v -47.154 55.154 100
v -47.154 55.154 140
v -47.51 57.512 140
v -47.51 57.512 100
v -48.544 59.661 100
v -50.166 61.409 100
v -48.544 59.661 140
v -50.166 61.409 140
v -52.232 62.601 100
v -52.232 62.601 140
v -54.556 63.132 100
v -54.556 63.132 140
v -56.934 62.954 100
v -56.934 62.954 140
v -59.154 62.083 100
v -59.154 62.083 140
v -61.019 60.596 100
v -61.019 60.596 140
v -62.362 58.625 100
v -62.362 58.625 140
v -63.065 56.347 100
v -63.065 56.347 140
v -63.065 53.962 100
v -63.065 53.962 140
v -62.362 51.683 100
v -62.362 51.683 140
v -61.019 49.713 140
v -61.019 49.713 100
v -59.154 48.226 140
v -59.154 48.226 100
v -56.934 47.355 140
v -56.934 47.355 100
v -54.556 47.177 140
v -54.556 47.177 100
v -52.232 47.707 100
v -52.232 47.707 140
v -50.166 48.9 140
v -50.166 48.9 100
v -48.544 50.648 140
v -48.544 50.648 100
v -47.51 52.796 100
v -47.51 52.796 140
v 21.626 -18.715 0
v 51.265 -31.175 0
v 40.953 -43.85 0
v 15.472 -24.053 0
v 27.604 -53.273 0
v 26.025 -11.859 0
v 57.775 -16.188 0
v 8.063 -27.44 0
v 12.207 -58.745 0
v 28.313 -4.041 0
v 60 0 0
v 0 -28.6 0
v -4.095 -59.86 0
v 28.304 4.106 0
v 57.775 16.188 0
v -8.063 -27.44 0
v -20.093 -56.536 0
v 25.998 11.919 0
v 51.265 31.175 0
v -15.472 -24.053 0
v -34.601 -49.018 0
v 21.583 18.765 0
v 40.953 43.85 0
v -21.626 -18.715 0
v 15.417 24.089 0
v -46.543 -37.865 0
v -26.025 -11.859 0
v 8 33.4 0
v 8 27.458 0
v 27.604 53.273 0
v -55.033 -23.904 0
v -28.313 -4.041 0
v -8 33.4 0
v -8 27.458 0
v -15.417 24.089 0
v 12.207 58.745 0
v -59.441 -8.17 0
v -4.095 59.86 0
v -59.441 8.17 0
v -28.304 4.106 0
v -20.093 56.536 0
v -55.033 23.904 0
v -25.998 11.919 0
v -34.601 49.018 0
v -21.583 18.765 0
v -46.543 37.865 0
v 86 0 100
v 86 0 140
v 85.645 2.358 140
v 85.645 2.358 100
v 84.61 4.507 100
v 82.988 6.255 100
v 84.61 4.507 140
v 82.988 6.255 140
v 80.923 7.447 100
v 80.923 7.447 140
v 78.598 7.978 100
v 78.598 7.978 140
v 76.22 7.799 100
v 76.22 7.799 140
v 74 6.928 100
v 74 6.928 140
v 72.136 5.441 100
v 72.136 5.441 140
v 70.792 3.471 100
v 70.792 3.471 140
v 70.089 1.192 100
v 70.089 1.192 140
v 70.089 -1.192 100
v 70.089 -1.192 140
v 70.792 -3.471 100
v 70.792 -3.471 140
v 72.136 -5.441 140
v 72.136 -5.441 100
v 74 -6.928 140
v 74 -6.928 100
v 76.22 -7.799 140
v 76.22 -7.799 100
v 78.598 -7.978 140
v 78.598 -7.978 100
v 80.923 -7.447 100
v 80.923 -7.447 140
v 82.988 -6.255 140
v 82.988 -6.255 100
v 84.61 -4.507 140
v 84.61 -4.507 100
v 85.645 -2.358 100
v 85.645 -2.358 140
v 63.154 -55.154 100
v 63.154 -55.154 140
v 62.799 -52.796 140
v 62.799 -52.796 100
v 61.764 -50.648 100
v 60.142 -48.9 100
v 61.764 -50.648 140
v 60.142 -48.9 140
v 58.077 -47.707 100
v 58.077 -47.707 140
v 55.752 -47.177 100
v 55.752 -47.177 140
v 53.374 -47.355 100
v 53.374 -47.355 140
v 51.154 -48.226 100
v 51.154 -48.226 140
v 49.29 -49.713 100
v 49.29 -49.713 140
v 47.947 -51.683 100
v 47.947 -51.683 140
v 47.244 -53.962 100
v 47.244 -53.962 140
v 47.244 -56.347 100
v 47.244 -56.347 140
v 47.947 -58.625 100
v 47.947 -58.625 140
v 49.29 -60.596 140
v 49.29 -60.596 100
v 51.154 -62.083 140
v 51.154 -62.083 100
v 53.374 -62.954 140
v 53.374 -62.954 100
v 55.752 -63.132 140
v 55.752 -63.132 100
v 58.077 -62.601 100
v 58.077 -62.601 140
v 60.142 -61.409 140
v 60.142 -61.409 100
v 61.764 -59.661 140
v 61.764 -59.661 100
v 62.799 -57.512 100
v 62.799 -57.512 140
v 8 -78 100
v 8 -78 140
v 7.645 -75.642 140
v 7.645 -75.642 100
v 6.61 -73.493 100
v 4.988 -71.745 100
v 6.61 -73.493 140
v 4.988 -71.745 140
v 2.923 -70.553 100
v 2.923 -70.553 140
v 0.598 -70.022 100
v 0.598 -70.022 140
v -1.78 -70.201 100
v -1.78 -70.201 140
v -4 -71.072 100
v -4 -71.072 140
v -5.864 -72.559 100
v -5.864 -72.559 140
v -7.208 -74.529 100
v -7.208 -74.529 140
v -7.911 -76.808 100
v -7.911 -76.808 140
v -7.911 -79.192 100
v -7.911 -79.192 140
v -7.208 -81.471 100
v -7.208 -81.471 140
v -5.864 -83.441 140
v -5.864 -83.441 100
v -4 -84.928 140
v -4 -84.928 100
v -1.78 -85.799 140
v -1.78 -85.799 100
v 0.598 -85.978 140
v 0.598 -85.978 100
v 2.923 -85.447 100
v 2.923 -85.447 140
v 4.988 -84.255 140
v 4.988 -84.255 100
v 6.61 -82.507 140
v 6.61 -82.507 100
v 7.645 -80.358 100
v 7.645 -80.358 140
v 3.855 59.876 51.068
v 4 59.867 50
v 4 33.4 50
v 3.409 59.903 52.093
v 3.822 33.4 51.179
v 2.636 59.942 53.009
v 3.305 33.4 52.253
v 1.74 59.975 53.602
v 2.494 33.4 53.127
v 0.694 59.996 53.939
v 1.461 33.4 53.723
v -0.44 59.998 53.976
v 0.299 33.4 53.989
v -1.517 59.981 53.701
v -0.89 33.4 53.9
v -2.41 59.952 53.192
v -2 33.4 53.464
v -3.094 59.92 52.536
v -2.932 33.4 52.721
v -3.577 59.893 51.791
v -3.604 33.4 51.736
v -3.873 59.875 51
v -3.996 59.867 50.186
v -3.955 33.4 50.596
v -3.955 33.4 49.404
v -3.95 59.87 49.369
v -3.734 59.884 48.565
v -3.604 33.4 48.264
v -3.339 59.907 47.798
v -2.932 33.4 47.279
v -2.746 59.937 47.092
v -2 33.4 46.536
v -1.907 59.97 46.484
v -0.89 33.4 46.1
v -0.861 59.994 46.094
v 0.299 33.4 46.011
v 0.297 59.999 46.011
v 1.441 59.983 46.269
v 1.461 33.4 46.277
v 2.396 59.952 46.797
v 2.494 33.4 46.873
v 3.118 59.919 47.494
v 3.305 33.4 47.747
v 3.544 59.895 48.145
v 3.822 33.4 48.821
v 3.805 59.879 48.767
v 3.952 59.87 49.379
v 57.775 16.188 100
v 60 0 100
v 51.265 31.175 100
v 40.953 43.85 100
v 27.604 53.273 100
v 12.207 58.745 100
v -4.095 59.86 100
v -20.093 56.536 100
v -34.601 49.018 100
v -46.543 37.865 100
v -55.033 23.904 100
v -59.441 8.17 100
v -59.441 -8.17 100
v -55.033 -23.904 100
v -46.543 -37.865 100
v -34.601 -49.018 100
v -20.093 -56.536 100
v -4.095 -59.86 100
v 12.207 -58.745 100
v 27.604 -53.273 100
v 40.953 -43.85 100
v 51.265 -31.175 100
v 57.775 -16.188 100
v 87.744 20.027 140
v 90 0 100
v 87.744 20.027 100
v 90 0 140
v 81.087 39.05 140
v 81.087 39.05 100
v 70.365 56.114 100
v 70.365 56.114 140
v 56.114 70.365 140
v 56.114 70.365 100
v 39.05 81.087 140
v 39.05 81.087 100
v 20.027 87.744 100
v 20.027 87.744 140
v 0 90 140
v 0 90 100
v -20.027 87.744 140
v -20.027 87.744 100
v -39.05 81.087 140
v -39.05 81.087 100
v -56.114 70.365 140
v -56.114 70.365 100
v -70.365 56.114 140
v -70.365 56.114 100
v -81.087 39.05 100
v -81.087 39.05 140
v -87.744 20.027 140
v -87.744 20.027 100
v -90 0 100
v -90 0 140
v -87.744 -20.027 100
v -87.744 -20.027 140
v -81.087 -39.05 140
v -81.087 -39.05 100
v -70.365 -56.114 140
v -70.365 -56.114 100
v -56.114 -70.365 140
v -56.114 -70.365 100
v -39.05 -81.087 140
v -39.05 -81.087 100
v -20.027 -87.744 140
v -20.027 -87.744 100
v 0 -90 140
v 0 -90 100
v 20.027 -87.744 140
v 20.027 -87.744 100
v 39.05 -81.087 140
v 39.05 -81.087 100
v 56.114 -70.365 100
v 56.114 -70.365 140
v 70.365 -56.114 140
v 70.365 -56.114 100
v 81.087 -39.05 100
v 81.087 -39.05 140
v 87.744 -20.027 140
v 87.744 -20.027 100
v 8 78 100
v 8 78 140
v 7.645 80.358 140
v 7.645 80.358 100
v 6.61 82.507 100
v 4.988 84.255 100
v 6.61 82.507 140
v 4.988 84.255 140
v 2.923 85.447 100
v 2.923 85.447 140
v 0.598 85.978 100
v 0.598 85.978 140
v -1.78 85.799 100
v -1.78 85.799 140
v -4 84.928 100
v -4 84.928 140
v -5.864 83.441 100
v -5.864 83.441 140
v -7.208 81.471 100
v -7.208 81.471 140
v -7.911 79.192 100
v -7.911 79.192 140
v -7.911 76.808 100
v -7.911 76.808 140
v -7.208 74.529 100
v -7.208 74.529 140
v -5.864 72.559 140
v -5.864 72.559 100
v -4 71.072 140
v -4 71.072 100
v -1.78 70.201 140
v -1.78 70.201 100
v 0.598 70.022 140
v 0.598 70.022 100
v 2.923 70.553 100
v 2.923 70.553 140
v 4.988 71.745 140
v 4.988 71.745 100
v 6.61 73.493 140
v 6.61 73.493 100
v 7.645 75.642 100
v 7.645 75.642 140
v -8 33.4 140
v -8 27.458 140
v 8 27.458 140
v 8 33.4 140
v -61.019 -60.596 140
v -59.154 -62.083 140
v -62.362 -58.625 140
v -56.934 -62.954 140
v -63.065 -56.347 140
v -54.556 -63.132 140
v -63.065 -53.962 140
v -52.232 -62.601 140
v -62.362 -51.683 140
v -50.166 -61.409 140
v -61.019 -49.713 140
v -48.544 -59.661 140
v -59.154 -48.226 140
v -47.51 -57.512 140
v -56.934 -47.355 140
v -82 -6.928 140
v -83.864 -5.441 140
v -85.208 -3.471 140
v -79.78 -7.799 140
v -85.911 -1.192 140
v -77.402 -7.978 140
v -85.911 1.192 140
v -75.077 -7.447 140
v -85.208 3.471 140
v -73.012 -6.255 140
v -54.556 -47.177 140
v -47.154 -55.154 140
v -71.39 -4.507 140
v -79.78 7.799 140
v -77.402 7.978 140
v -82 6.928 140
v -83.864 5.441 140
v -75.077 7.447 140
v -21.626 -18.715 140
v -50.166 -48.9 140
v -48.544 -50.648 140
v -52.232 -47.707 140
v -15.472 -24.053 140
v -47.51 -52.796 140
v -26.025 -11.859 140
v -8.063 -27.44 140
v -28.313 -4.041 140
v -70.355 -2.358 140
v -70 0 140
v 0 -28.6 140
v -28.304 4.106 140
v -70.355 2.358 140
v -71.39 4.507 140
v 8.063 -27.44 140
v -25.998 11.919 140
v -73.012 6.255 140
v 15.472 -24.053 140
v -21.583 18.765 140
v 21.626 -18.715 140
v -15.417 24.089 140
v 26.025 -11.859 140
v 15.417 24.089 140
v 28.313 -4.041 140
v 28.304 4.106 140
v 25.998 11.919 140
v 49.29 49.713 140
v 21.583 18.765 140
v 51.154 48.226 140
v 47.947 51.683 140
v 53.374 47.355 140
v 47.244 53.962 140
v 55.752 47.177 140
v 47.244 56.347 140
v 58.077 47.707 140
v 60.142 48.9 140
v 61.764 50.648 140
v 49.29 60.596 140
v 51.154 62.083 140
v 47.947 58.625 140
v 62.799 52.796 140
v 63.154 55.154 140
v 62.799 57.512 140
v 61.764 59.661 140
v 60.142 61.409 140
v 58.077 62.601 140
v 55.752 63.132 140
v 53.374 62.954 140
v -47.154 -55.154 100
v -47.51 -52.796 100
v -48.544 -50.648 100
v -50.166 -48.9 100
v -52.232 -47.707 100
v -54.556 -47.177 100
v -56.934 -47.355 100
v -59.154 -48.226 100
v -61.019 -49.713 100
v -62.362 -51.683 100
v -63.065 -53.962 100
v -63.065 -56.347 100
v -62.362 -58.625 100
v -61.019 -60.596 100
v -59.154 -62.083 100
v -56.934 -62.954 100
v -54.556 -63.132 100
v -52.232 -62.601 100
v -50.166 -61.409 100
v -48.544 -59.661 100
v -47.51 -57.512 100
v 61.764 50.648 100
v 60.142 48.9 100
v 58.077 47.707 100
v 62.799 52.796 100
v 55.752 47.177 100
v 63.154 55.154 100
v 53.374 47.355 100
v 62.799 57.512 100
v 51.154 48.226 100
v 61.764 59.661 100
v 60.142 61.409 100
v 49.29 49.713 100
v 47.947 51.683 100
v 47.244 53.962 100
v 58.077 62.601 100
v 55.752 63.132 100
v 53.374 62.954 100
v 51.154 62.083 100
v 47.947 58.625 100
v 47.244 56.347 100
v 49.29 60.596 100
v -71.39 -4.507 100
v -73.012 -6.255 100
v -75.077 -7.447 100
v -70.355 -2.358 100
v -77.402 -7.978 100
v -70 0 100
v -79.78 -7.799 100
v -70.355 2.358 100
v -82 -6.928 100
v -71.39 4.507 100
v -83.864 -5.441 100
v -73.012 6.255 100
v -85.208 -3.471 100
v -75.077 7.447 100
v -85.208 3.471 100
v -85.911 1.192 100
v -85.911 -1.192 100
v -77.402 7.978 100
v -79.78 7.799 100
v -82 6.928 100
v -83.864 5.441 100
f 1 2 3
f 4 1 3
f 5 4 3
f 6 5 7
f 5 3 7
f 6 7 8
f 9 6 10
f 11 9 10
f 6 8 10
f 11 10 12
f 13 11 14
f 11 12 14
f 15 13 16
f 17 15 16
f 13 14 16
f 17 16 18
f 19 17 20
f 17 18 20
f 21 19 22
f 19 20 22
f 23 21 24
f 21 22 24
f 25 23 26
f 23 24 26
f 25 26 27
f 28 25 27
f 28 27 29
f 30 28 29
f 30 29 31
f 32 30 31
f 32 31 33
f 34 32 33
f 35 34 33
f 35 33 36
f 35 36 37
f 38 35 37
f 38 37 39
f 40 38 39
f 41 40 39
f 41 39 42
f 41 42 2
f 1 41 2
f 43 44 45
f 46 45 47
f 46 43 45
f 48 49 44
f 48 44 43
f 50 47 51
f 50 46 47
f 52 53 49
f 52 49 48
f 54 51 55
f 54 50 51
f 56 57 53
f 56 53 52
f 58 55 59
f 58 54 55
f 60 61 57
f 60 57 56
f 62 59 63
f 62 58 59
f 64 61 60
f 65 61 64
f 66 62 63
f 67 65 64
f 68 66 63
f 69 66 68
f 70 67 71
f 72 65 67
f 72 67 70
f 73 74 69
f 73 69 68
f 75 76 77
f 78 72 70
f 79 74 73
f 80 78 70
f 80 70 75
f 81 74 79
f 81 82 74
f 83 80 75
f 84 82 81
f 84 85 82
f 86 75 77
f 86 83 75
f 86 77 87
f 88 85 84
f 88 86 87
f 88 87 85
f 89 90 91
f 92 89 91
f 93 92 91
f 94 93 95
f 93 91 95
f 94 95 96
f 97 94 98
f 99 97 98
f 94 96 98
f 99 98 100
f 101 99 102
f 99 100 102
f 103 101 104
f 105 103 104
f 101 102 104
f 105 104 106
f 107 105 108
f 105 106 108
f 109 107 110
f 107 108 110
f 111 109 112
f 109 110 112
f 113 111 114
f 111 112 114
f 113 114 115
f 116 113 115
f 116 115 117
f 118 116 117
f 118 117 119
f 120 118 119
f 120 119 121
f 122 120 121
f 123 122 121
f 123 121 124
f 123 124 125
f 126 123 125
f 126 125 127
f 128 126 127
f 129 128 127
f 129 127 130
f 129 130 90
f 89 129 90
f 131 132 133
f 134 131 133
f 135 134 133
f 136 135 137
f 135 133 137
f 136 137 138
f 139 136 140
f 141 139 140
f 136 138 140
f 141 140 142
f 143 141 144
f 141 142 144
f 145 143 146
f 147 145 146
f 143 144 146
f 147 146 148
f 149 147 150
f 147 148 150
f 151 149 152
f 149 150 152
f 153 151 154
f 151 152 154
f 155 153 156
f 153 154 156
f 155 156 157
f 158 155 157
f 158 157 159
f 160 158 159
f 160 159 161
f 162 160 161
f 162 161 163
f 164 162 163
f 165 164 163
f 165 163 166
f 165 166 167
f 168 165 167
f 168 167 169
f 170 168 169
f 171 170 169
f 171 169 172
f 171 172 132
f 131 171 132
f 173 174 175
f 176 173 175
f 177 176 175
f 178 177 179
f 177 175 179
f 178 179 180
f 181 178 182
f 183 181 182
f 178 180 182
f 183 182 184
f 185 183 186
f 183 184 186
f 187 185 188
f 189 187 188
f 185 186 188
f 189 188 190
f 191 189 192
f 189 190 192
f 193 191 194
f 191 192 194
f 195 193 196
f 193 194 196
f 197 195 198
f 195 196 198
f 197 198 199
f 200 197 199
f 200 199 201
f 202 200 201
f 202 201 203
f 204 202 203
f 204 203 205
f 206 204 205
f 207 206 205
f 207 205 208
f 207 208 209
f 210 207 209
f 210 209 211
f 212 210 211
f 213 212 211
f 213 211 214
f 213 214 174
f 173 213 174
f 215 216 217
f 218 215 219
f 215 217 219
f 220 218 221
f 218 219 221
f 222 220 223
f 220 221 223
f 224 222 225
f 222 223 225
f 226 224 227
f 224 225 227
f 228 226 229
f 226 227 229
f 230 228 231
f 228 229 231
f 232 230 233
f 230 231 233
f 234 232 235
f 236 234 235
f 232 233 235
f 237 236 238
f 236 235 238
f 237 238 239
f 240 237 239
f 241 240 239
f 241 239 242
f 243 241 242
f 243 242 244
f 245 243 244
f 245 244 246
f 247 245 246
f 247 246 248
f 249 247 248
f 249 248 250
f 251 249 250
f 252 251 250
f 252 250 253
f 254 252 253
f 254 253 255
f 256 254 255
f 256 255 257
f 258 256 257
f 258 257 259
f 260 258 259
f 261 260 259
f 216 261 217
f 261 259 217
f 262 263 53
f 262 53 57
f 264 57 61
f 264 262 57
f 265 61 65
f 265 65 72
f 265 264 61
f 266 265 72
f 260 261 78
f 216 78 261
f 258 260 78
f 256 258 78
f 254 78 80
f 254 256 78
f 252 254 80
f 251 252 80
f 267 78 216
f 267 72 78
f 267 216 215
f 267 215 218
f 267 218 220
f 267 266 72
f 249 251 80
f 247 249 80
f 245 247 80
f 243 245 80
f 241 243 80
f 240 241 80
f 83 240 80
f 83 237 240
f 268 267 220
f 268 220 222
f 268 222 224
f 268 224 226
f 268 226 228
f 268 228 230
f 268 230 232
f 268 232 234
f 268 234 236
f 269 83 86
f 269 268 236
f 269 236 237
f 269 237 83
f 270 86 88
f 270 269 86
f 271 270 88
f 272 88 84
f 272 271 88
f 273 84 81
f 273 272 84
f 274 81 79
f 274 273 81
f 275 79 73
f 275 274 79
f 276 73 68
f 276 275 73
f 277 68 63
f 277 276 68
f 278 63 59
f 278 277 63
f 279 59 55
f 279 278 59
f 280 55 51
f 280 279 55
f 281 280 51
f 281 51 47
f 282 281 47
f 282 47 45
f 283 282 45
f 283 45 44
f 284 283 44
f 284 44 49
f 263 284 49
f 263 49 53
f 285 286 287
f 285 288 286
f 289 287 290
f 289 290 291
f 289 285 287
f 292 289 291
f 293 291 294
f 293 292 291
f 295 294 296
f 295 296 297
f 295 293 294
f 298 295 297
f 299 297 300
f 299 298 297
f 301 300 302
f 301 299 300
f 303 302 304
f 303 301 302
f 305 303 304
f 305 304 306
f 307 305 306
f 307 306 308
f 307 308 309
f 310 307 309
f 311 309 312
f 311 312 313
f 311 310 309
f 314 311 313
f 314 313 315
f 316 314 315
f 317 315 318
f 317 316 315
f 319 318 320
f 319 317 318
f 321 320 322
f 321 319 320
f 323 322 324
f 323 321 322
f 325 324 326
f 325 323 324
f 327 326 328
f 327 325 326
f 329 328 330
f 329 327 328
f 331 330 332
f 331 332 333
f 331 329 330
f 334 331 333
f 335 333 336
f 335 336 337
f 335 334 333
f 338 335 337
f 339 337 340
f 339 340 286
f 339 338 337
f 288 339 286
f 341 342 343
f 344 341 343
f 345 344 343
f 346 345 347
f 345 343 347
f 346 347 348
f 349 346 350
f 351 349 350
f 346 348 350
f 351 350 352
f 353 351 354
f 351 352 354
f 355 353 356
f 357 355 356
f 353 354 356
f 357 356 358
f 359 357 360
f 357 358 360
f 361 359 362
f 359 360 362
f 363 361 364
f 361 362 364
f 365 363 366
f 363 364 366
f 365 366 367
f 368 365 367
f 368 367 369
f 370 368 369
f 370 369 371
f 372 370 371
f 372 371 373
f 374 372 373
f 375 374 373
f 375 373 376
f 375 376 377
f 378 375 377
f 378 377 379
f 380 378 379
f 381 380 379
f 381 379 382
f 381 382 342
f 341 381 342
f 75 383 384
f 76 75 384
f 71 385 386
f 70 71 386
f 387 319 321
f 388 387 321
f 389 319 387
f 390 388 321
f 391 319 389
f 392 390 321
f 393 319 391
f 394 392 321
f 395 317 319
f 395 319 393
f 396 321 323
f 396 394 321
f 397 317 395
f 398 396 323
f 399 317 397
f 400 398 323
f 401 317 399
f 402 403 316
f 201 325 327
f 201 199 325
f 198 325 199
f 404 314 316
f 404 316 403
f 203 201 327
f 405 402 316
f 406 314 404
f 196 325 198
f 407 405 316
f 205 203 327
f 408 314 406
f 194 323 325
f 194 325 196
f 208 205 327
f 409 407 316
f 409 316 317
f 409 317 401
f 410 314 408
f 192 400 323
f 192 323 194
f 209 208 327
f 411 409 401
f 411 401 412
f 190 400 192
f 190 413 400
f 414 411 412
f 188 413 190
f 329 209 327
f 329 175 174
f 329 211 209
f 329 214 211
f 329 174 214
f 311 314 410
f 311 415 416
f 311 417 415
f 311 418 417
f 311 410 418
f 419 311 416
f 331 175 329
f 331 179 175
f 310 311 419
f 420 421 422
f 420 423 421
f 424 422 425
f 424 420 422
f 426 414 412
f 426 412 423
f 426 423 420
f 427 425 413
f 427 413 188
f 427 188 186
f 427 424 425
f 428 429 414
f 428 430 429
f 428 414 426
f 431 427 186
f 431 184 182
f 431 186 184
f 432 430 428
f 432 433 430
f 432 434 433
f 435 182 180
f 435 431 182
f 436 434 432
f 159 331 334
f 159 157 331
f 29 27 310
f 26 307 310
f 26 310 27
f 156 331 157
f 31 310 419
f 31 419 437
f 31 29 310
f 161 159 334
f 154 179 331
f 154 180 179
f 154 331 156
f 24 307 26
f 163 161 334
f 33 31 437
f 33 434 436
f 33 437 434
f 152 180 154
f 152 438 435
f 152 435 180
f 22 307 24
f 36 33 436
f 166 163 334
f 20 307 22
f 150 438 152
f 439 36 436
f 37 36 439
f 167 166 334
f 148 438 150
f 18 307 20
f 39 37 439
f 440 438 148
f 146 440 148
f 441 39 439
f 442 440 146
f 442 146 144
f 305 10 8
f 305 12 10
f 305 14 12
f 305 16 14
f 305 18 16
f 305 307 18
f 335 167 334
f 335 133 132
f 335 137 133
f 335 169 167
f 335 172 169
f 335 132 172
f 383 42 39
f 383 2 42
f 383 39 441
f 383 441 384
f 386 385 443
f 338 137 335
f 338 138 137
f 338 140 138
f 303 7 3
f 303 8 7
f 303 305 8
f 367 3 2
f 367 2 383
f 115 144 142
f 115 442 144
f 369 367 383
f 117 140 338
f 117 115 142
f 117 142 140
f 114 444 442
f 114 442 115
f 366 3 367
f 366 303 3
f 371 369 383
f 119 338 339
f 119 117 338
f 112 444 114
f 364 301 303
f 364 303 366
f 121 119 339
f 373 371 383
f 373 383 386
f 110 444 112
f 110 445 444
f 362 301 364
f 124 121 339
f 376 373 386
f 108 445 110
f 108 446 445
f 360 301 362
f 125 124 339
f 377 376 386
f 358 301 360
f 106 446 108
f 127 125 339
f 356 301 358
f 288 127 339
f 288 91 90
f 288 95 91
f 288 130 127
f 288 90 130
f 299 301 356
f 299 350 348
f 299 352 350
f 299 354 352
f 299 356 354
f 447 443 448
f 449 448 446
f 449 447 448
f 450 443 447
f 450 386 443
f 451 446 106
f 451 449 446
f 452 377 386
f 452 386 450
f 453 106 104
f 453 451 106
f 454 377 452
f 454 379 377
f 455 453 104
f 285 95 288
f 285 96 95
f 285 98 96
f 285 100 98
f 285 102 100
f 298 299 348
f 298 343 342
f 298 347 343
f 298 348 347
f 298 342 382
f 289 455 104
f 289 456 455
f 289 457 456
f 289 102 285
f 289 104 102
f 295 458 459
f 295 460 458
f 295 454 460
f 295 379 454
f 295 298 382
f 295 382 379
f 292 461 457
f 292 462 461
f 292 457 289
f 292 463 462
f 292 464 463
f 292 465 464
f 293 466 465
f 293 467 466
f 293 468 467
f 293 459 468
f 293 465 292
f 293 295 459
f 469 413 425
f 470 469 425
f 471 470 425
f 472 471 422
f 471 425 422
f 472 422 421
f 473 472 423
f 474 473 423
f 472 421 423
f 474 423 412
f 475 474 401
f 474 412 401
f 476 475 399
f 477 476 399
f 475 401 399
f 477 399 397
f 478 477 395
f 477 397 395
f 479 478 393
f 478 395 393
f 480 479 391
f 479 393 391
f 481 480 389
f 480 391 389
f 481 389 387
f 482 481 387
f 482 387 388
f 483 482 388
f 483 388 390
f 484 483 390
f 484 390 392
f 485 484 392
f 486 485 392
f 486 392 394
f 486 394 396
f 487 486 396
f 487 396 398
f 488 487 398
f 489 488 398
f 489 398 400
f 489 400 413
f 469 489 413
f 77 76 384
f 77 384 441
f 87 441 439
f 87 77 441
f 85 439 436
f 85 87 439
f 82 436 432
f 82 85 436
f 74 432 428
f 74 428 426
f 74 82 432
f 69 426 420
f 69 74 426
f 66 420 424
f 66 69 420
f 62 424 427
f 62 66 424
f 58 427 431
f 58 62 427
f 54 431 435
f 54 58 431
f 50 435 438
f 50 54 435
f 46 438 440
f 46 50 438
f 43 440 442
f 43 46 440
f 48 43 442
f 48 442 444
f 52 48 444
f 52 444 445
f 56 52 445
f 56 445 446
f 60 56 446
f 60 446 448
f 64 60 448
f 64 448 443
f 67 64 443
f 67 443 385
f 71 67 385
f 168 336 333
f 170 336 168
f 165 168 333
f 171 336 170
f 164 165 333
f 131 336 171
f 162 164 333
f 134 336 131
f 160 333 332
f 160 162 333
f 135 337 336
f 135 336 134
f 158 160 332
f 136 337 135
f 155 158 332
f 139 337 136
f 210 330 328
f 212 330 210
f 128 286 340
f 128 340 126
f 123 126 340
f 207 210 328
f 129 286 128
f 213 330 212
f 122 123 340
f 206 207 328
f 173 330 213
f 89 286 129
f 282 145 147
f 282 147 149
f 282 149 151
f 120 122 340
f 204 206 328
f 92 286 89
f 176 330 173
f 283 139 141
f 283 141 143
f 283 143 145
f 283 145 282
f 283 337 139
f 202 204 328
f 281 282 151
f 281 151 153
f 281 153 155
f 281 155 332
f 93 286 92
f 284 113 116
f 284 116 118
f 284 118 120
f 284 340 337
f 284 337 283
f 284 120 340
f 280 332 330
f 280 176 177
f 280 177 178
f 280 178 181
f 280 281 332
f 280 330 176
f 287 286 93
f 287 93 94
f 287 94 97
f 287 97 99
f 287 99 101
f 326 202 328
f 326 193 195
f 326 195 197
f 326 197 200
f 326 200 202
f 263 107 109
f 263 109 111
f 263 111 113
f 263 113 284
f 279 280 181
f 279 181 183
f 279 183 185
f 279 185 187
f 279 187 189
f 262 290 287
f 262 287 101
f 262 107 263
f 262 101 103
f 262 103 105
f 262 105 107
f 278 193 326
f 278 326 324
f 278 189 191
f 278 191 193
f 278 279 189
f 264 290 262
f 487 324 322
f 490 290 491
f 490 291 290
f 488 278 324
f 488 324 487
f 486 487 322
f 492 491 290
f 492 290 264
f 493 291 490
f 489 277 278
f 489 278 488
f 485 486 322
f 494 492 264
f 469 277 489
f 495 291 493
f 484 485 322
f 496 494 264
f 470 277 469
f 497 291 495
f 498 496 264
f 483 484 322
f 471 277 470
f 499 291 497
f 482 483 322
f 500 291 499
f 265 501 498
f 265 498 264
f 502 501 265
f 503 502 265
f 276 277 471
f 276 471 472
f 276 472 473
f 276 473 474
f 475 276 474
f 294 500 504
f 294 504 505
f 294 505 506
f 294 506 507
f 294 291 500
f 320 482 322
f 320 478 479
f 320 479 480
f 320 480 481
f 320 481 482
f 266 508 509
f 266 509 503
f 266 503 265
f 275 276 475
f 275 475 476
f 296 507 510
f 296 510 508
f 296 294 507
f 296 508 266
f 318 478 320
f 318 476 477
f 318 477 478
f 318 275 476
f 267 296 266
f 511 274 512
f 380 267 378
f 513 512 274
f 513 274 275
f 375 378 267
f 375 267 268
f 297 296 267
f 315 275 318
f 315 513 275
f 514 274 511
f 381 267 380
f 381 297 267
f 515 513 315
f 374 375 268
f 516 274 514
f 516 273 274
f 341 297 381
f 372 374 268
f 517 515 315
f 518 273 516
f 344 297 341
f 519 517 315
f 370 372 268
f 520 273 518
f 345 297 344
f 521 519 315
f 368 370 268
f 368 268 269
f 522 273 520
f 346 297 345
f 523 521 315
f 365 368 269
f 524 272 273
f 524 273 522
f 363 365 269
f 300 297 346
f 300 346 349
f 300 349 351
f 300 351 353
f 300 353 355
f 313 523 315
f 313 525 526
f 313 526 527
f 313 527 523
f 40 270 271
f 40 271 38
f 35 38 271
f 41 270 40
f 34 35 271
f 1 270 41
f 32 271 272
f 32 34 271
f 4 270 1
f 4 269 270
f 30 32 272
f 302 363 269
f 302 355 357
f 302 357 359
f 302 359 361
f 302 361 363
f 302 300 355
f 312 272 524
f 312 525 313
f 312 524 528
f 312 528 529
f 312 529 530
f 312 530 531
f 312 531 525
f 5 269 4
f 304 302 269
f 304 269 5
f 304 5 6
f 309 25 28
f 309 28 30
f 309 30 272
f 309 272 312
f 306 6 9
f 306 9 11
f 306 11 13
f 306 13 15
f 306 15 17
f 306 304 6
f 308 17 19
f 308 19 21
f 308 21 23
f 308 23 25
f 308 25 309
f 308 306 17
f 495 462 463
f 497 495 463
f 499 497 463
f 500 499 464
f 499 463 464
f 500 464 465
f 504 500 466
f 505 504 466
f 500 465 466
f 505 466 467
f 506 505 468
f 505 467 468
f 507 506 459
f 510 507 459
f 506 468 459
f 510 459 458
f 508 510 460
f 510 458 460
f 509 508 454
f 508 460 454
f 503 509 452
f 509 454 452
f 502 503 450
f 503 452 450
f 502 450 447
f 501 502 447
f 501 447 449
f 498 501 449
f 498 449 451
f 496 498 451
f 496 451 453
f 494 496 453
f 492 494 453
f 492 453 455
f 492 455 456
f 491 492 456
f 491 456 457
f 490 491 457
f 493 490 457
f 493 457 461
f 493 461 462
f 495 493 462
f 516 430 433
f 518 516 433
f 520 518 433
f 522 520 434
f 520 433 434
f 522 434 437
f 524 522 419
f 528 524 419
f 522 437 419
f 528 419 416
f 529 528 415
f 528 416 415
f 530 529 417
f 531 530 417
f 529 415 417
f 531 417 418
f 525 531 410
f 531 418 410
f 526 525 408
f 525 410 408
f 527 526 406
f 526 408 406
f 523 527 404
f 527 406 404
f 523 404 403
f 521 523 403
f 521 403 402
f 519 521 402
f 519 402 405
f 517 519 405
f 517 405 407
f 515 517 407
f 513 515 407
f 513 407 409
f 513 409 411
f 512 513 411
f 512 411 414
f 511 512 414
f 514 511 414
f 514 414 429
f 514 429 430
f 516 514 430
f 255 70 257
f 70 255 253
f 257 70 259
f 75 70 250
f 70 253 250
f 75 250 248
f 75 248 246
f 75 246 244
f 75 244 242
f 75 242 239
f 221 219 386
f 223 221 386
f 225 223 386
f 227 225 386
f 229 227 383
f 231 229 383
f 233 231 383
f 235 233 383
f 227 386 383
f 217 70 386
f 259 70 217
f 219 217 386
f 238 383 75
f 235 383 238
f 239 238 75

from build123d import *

# Parameters (mm, degrees)
F3_DEPTH = 140.001
F4_R     = 8
F5_DEPTH = 140.001
F6_R     = 4
F7_DEPTH = 90.001


with BuildPart() as f1:
    # F0 (on Front) → F1 (revolve)
    with BuildSketch(Plane.XZ):
        Polygon((28.6, 140), (28.6, 0), (60, 0), (60, 100), (90, 100), (90, 140), align=None)
    revolve(axis=Axis((0, 0, 42.943615), (0, 0, 1)))

    # F2 (on face) → F3 (cut, through all)
    with BuildSketch(Plane.XY.offset(140)):
        with BuildLine():
            Line((8, 33.4), (-8, 33.4))
            Line((-8, 33.4), (-8, 27.458332))
            ThreePointArc((-8, 27.458332), (0, 28.6), (8, 27.458332))
            Line((8, 27.458332), (8, 33.4))
        make_face()
    extrude(amount=-F3_DEPTH, mode=Mode.SUBTRACT)

    # F4 (on face) → F5 (cut, through all)
    with BuildSketch(Plane.XY.offset(140)):
        with Locations((-55.154329, 55.154329)):
            Circle(F4_R)
        with Locations((0, 78)):
            Circle(F4_R)
        with Locations((55.154329, 55.154329)):
            Circle(F4_R)
        with Locations((78, 0)):
            Circle(F4_R)
        with Locations((55.154329, -55.154329)):
            Circle(F4_R)
        with Locations((0, -78)):
            Circle(F4_R)
        with Locations((-55.154329, -55.154329)):
            Circle(F4_R)
        with Locations((-78, 0)):
            Circle(F4_R)
    extrude(amount=-F5_DEPTH, mode=Mode.SUBTRACT)

    # F6 (on Front) → F7 (cut, through all)
    with BuildSketch(Plane.XZ):
        with Locations((0, 50)):
            Circle(F6_R)
    extrude(amount=-F7_DEPTH, mode=Mode.SUBTRACT)


solid = f1.part
